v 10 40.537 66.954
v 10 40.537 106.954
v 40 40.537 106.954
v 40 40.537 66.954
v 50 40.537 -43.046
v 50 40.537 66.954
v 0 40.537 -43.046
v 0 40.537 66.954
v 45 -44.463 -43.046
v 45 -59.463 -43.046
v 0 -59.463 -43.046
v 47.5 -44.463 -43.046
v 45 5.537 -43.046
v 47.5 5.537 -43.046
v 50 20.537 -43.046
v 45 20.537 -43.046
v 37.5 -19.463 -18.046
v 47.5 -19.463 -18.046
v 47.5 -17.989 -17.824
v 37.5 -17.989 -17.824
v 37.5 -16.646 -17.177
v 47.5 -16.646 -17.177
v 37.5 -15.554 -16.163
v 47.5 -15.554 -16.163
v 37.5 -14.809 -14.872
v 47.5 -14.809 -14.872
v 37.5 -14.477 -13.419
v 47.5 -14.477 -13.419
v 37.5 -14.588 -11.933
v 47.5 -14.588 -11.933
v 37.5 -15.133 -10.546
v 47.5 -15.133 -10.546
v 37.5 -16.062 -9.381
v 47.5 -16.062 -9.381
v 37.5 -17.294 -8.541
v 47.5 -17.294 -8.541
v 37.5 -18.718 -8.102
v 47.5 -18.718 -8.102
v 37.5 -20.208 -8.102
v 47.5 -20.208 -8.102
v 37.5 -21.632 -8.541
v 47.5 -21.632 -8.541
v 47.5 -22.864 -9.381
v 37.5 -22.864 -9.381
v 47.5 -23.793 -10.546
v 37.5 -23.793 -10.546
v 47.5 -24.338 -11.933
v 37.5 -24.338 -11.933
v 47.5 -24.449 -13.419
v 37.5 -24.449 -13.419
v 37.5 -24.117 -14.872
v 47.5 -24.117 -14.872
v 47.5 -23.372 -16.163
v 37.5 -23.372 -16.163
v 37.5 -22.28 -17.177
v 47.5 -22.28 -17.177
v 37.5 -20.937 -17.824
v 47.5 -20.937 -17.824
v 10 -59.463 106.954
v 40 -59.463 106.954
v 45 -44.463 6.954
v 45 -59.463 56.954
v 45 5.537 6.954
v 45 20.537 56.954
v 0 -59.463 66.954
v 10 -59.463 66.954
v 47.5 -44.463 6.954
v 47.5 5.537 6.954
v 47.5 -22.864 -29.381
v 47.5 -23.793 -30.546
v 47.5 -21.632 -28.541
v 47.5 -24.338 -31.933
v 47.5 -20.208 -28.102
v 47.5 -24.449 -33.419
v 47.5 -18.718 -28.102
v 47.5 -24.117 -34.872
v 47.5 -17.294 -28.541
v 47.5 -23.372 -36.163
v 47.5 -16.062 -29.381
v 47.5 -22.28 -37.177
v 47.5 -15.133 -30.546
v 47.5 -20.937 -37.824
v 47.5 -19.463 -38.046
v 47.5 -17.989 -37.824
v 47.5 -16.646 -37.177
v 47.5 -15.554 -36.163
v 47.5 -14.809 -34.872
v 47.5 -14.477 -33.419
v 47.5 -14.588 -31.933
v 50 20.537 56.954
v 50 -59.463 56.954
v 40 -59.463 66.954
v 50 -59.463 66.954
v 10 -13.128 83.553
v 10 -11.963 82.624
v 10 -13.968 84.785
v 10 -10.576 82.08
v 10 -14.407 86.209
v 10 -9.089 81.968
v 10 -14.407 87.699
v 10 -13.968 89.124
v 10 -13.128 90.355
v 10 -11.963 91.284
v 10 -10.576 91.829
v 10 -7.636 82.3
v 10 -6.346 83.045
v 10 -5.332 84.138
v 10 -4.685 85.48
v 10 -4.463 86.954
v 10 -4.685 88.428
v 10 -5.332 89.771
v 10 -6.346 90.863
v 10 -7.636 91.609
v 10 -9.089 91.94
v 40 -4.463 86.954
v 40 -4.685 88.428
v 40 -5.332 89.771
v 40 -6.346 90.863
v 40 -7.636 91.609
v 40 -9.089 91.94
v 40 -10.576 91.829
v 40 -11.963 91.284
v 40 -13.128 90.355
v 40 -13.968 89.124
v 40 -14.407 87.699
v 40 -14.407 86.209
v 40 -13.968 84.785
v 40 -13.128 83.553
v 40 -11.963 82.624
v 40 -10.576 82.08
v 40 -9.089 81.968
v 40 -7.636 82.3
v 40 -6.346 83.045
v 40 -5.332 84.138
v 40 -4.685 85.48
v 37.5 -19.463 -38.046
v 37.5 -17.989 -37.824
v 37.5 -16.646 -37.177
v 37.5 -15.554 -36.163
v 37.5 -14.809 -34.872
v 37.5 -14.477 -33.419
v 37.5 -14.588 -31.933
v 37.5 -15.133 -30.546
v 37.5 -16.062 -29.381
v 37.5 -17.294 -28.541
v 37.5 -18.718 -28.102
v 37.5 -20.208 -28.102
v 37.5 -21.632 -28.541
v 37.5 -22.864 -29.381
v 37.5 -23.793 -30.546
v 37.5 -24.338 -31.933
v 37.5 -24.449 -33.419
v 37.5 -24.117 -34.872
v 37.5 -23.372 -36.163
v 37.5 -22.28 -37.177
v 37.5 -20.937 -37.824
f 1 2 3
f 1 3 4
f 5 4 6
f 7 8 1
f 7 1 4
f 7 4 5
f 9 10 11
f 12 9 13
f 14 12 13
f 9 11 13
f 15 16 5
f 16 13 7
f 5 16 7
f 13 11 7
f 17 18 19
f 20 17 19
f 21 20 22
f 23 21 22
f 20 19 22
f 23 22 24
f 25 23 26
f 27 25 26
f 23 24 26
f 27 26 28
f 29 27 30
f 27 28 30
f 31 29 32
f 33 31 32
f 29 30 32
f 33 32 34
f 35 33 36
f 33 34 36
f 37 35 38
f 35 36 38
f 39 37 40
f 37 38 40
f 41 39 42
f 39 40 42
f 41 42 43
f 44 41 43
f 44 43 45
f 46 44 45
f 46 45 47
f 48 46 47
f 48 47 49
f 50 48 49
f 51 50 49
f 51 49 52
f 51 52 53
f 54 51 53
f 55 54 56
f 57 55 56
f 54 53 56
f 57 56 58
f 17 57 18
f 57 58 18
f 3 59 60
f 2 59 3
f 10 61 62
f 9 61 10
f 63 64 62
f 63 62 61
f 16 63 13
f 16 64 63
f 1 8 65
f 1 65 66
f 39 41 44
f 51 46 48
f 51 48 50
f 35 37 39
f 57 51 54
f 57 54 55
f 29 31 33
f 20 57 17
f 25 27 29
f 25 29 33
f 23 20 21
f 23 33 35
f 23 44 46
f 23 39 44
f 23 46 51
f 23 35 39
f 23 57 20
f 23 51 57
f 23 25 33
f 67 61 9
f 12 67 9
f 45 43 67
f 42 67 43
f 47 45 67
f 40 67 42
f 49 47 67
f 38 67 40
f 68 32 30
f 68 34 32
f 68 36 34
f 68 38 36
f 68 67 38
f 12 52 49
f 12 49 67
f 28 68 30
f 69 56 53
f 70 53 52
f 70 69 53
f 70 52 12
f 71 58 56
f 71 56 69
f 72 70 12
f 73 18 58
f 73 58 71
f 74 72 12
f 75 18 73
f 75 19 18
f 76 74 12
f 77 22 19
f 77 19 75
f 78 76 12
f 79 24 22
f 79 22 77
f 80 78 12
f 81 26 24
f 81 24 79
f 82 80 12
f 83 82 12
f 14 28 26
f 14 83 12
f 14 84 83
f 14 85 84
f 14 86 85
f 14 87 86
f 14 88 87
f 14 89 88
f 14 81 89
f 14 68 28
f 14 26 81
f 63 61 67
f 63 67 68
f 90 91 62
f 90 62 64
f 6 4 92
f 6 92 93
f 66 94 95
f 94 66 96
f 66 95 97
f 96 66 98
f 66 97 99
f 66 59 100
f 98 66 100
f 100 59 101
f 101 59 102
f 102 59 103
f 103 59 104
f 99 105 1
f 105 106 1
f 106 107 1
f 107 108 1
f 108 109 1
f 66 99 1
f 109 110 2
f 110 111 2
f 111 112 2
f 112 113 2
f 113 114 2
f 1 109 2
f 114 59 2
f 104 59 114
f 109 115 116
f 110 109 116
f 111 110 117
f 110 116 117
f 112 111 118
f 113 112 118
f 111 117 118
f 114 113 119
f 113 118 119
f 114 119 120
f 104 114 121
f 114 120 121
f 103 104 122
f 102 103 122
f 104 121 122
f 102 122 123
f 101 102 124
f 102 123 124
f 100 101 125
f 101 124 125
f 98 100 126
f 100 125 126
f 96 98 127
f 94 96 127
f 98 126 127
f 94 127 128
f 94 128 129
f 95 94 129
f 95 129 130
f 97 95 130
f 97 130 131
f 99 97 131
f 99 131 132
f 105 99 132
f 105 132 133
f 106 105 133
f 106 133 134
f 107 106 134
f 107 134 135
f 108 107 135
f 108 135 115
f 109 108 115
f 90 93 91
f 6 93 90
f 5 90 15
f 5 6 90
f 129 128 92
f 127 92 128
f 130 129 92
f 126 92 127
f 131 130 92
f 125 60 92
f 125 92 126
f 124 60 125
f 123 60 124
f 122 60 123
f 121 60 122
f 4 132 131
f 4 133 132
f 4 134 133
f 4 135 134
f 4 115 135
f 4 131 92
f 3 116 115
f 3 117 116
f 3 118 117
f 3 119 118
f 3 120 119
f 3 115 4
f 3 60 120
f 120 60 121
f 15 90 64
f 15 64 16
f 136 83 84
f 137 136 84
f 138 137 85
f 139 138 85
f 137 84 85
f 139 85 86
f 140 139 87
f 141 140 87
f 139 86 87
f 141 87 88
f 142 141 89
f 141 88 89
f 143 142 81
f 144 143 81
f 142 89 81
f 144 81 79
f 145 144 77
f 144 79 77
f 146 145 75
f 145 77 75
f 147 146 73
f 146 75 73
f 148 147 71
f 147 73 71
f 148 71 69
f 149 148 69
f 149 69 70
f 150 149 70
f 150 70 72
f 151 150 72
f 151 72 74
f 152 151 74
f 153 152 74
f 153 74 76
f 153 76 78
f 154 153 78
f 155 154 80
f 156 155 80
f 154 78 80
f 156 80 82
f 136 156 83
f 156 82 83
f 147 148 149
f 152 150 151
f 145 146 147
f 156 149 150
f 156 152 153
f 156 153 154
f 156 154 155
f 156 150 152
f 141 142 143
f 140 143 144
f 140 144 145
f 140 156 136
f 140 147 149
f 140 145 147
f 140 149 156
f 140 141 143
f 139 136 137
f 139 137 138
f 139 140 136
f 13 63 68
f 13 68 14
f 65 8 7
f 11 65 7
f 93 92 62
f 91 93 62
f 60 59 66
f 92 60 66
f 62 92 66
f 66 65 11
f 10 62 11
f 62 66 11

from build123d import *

# Parameters (mm, degrees)
SKIZZE1_W                       = 150
SKIZZE1_H                       = 100
AUFSATZ_LINEAR_AUSTRAGEN1_DEPTH = 50
SKIZZE2_W                       = 100
SKIZZE2_H                       = 80
SCHNITT_LINEAR_AUSTRAGEN1_DEPTH = 5
SKIZZE3_W                       = 50
SKIZZE3_H                       = 50
AUFSATZ_LINEAR_AUSTRAGEN2_DEPTH = 2.5
SKIZZE4_R                       = 5
SCHNITT_LINEAR_AUSTRAGEN2_DEPTH = 10
SKIZZE5_W                       = 10
SKIZZE5_H                       = 100
SCHNITT_LINEAR_AUSTRAGEN3_DEPTH = 40
SKIZZE6_R                       = 5
SCHNITT_LINEAR_AUSTRAGEN4_DEPTH = 40


with BuildPart() as part:
    # Skizze1 → Aufsatz-Linear austragen1 (new body)
    with BuildSketch(Plane(origin=(0, 0, 0), x_dir=(0, 0, -1), z_dir=(1, 0, 0))):
        with Locations((-31.954225352, -9.463028169)):
            Rectangle(SKIZZE1_W, SKIZZE1_H)
    extrude(amount=AUFSATZ_LINEAR_AUSTRAGEN1_DEPTH)

    # Skizze2 → Schnitt-Linear austragen1 (cut)
    with BuildSketch(Plane(origin=(50, 0, 0), x_dir=(0, 0, -1), z_dir=(1, 0, 0))):
        with Locations((-6.954225352, -19.463028169)):
            Rectangle(SKIZZE2_W, SKIZZE2_H)
    extrude(amount=-SCHNITT_LINEAR_AUSTRAGEN1_DEPTH, mode=Mode.SUBTRACT)

    # Skizze3 → Aufsatz-Linear austragen2 (add)
    with BuildSketch(Plane(origin=(45, 0, 0), x_dir=(0, 0, -1), z_dir=(1, 0, 0))):
        with Locations((18.045774648, -19.463028169)):
            Rectangle(SKIZZE3_W, SKIZZE3_H)
    extrude(amount=AUFSATZ_LINEAR_AUSTRAGEN2_DEPTH)

    # Skizze4 → Schnitt-Linear austragen2 (cut)
    with BuildSketch(Plane(origin=(47.5, 0, 0), x_dir=(0, 0, -1), z_dir=(1, 0, 0))):
        with Locations((33.045774648, -19.463028169)):
            Circle(SKIZZE4_R)
        with Locations((13.045774648, -19.463028169)):
            Circle(SKIZZE4_R)
    extrude(amount=-SCHNITT_LINEAR_AUSTRAGEN2_DEPTH, mode=Mode.SUBTRACT)

    # Skizze5 → Schnitt-Linear austragen3 (cut)
    with BuildSketch(Plane.XY.offset(106.954225352)):
        with Locations((5, -9.463028169)):
            Rectangle(SKIZZE5_W, SKIZZE5_H)
        with Locations((45, -9.463028169)):
            Rectangle(SKIZZE5_W, SKIZZE5_H)
    extrude(amount=-SCHNITT_LINEAR_AUSTRAGEN3_DEPTH, mode=Mode.SUBTRACT)

    # Skizze6 → Schnitt-Linear austragen4 (cut)
    with BuildSketch(Plane(origin=(40, 0, 0), x_dir=(0, 0, -1), z_dir=(1, 0, 0))):
        with Locations(Location((-86.954225352, -9.463028169, 0), (0, 0, 90))):
            Circle(SKIZZE6_R)
    extrude(amount=-SCHNITT_LINEAR_AUSTRAGEN4_DEPTH, mode=Mode.SUBTRACT)


solid = part.part
